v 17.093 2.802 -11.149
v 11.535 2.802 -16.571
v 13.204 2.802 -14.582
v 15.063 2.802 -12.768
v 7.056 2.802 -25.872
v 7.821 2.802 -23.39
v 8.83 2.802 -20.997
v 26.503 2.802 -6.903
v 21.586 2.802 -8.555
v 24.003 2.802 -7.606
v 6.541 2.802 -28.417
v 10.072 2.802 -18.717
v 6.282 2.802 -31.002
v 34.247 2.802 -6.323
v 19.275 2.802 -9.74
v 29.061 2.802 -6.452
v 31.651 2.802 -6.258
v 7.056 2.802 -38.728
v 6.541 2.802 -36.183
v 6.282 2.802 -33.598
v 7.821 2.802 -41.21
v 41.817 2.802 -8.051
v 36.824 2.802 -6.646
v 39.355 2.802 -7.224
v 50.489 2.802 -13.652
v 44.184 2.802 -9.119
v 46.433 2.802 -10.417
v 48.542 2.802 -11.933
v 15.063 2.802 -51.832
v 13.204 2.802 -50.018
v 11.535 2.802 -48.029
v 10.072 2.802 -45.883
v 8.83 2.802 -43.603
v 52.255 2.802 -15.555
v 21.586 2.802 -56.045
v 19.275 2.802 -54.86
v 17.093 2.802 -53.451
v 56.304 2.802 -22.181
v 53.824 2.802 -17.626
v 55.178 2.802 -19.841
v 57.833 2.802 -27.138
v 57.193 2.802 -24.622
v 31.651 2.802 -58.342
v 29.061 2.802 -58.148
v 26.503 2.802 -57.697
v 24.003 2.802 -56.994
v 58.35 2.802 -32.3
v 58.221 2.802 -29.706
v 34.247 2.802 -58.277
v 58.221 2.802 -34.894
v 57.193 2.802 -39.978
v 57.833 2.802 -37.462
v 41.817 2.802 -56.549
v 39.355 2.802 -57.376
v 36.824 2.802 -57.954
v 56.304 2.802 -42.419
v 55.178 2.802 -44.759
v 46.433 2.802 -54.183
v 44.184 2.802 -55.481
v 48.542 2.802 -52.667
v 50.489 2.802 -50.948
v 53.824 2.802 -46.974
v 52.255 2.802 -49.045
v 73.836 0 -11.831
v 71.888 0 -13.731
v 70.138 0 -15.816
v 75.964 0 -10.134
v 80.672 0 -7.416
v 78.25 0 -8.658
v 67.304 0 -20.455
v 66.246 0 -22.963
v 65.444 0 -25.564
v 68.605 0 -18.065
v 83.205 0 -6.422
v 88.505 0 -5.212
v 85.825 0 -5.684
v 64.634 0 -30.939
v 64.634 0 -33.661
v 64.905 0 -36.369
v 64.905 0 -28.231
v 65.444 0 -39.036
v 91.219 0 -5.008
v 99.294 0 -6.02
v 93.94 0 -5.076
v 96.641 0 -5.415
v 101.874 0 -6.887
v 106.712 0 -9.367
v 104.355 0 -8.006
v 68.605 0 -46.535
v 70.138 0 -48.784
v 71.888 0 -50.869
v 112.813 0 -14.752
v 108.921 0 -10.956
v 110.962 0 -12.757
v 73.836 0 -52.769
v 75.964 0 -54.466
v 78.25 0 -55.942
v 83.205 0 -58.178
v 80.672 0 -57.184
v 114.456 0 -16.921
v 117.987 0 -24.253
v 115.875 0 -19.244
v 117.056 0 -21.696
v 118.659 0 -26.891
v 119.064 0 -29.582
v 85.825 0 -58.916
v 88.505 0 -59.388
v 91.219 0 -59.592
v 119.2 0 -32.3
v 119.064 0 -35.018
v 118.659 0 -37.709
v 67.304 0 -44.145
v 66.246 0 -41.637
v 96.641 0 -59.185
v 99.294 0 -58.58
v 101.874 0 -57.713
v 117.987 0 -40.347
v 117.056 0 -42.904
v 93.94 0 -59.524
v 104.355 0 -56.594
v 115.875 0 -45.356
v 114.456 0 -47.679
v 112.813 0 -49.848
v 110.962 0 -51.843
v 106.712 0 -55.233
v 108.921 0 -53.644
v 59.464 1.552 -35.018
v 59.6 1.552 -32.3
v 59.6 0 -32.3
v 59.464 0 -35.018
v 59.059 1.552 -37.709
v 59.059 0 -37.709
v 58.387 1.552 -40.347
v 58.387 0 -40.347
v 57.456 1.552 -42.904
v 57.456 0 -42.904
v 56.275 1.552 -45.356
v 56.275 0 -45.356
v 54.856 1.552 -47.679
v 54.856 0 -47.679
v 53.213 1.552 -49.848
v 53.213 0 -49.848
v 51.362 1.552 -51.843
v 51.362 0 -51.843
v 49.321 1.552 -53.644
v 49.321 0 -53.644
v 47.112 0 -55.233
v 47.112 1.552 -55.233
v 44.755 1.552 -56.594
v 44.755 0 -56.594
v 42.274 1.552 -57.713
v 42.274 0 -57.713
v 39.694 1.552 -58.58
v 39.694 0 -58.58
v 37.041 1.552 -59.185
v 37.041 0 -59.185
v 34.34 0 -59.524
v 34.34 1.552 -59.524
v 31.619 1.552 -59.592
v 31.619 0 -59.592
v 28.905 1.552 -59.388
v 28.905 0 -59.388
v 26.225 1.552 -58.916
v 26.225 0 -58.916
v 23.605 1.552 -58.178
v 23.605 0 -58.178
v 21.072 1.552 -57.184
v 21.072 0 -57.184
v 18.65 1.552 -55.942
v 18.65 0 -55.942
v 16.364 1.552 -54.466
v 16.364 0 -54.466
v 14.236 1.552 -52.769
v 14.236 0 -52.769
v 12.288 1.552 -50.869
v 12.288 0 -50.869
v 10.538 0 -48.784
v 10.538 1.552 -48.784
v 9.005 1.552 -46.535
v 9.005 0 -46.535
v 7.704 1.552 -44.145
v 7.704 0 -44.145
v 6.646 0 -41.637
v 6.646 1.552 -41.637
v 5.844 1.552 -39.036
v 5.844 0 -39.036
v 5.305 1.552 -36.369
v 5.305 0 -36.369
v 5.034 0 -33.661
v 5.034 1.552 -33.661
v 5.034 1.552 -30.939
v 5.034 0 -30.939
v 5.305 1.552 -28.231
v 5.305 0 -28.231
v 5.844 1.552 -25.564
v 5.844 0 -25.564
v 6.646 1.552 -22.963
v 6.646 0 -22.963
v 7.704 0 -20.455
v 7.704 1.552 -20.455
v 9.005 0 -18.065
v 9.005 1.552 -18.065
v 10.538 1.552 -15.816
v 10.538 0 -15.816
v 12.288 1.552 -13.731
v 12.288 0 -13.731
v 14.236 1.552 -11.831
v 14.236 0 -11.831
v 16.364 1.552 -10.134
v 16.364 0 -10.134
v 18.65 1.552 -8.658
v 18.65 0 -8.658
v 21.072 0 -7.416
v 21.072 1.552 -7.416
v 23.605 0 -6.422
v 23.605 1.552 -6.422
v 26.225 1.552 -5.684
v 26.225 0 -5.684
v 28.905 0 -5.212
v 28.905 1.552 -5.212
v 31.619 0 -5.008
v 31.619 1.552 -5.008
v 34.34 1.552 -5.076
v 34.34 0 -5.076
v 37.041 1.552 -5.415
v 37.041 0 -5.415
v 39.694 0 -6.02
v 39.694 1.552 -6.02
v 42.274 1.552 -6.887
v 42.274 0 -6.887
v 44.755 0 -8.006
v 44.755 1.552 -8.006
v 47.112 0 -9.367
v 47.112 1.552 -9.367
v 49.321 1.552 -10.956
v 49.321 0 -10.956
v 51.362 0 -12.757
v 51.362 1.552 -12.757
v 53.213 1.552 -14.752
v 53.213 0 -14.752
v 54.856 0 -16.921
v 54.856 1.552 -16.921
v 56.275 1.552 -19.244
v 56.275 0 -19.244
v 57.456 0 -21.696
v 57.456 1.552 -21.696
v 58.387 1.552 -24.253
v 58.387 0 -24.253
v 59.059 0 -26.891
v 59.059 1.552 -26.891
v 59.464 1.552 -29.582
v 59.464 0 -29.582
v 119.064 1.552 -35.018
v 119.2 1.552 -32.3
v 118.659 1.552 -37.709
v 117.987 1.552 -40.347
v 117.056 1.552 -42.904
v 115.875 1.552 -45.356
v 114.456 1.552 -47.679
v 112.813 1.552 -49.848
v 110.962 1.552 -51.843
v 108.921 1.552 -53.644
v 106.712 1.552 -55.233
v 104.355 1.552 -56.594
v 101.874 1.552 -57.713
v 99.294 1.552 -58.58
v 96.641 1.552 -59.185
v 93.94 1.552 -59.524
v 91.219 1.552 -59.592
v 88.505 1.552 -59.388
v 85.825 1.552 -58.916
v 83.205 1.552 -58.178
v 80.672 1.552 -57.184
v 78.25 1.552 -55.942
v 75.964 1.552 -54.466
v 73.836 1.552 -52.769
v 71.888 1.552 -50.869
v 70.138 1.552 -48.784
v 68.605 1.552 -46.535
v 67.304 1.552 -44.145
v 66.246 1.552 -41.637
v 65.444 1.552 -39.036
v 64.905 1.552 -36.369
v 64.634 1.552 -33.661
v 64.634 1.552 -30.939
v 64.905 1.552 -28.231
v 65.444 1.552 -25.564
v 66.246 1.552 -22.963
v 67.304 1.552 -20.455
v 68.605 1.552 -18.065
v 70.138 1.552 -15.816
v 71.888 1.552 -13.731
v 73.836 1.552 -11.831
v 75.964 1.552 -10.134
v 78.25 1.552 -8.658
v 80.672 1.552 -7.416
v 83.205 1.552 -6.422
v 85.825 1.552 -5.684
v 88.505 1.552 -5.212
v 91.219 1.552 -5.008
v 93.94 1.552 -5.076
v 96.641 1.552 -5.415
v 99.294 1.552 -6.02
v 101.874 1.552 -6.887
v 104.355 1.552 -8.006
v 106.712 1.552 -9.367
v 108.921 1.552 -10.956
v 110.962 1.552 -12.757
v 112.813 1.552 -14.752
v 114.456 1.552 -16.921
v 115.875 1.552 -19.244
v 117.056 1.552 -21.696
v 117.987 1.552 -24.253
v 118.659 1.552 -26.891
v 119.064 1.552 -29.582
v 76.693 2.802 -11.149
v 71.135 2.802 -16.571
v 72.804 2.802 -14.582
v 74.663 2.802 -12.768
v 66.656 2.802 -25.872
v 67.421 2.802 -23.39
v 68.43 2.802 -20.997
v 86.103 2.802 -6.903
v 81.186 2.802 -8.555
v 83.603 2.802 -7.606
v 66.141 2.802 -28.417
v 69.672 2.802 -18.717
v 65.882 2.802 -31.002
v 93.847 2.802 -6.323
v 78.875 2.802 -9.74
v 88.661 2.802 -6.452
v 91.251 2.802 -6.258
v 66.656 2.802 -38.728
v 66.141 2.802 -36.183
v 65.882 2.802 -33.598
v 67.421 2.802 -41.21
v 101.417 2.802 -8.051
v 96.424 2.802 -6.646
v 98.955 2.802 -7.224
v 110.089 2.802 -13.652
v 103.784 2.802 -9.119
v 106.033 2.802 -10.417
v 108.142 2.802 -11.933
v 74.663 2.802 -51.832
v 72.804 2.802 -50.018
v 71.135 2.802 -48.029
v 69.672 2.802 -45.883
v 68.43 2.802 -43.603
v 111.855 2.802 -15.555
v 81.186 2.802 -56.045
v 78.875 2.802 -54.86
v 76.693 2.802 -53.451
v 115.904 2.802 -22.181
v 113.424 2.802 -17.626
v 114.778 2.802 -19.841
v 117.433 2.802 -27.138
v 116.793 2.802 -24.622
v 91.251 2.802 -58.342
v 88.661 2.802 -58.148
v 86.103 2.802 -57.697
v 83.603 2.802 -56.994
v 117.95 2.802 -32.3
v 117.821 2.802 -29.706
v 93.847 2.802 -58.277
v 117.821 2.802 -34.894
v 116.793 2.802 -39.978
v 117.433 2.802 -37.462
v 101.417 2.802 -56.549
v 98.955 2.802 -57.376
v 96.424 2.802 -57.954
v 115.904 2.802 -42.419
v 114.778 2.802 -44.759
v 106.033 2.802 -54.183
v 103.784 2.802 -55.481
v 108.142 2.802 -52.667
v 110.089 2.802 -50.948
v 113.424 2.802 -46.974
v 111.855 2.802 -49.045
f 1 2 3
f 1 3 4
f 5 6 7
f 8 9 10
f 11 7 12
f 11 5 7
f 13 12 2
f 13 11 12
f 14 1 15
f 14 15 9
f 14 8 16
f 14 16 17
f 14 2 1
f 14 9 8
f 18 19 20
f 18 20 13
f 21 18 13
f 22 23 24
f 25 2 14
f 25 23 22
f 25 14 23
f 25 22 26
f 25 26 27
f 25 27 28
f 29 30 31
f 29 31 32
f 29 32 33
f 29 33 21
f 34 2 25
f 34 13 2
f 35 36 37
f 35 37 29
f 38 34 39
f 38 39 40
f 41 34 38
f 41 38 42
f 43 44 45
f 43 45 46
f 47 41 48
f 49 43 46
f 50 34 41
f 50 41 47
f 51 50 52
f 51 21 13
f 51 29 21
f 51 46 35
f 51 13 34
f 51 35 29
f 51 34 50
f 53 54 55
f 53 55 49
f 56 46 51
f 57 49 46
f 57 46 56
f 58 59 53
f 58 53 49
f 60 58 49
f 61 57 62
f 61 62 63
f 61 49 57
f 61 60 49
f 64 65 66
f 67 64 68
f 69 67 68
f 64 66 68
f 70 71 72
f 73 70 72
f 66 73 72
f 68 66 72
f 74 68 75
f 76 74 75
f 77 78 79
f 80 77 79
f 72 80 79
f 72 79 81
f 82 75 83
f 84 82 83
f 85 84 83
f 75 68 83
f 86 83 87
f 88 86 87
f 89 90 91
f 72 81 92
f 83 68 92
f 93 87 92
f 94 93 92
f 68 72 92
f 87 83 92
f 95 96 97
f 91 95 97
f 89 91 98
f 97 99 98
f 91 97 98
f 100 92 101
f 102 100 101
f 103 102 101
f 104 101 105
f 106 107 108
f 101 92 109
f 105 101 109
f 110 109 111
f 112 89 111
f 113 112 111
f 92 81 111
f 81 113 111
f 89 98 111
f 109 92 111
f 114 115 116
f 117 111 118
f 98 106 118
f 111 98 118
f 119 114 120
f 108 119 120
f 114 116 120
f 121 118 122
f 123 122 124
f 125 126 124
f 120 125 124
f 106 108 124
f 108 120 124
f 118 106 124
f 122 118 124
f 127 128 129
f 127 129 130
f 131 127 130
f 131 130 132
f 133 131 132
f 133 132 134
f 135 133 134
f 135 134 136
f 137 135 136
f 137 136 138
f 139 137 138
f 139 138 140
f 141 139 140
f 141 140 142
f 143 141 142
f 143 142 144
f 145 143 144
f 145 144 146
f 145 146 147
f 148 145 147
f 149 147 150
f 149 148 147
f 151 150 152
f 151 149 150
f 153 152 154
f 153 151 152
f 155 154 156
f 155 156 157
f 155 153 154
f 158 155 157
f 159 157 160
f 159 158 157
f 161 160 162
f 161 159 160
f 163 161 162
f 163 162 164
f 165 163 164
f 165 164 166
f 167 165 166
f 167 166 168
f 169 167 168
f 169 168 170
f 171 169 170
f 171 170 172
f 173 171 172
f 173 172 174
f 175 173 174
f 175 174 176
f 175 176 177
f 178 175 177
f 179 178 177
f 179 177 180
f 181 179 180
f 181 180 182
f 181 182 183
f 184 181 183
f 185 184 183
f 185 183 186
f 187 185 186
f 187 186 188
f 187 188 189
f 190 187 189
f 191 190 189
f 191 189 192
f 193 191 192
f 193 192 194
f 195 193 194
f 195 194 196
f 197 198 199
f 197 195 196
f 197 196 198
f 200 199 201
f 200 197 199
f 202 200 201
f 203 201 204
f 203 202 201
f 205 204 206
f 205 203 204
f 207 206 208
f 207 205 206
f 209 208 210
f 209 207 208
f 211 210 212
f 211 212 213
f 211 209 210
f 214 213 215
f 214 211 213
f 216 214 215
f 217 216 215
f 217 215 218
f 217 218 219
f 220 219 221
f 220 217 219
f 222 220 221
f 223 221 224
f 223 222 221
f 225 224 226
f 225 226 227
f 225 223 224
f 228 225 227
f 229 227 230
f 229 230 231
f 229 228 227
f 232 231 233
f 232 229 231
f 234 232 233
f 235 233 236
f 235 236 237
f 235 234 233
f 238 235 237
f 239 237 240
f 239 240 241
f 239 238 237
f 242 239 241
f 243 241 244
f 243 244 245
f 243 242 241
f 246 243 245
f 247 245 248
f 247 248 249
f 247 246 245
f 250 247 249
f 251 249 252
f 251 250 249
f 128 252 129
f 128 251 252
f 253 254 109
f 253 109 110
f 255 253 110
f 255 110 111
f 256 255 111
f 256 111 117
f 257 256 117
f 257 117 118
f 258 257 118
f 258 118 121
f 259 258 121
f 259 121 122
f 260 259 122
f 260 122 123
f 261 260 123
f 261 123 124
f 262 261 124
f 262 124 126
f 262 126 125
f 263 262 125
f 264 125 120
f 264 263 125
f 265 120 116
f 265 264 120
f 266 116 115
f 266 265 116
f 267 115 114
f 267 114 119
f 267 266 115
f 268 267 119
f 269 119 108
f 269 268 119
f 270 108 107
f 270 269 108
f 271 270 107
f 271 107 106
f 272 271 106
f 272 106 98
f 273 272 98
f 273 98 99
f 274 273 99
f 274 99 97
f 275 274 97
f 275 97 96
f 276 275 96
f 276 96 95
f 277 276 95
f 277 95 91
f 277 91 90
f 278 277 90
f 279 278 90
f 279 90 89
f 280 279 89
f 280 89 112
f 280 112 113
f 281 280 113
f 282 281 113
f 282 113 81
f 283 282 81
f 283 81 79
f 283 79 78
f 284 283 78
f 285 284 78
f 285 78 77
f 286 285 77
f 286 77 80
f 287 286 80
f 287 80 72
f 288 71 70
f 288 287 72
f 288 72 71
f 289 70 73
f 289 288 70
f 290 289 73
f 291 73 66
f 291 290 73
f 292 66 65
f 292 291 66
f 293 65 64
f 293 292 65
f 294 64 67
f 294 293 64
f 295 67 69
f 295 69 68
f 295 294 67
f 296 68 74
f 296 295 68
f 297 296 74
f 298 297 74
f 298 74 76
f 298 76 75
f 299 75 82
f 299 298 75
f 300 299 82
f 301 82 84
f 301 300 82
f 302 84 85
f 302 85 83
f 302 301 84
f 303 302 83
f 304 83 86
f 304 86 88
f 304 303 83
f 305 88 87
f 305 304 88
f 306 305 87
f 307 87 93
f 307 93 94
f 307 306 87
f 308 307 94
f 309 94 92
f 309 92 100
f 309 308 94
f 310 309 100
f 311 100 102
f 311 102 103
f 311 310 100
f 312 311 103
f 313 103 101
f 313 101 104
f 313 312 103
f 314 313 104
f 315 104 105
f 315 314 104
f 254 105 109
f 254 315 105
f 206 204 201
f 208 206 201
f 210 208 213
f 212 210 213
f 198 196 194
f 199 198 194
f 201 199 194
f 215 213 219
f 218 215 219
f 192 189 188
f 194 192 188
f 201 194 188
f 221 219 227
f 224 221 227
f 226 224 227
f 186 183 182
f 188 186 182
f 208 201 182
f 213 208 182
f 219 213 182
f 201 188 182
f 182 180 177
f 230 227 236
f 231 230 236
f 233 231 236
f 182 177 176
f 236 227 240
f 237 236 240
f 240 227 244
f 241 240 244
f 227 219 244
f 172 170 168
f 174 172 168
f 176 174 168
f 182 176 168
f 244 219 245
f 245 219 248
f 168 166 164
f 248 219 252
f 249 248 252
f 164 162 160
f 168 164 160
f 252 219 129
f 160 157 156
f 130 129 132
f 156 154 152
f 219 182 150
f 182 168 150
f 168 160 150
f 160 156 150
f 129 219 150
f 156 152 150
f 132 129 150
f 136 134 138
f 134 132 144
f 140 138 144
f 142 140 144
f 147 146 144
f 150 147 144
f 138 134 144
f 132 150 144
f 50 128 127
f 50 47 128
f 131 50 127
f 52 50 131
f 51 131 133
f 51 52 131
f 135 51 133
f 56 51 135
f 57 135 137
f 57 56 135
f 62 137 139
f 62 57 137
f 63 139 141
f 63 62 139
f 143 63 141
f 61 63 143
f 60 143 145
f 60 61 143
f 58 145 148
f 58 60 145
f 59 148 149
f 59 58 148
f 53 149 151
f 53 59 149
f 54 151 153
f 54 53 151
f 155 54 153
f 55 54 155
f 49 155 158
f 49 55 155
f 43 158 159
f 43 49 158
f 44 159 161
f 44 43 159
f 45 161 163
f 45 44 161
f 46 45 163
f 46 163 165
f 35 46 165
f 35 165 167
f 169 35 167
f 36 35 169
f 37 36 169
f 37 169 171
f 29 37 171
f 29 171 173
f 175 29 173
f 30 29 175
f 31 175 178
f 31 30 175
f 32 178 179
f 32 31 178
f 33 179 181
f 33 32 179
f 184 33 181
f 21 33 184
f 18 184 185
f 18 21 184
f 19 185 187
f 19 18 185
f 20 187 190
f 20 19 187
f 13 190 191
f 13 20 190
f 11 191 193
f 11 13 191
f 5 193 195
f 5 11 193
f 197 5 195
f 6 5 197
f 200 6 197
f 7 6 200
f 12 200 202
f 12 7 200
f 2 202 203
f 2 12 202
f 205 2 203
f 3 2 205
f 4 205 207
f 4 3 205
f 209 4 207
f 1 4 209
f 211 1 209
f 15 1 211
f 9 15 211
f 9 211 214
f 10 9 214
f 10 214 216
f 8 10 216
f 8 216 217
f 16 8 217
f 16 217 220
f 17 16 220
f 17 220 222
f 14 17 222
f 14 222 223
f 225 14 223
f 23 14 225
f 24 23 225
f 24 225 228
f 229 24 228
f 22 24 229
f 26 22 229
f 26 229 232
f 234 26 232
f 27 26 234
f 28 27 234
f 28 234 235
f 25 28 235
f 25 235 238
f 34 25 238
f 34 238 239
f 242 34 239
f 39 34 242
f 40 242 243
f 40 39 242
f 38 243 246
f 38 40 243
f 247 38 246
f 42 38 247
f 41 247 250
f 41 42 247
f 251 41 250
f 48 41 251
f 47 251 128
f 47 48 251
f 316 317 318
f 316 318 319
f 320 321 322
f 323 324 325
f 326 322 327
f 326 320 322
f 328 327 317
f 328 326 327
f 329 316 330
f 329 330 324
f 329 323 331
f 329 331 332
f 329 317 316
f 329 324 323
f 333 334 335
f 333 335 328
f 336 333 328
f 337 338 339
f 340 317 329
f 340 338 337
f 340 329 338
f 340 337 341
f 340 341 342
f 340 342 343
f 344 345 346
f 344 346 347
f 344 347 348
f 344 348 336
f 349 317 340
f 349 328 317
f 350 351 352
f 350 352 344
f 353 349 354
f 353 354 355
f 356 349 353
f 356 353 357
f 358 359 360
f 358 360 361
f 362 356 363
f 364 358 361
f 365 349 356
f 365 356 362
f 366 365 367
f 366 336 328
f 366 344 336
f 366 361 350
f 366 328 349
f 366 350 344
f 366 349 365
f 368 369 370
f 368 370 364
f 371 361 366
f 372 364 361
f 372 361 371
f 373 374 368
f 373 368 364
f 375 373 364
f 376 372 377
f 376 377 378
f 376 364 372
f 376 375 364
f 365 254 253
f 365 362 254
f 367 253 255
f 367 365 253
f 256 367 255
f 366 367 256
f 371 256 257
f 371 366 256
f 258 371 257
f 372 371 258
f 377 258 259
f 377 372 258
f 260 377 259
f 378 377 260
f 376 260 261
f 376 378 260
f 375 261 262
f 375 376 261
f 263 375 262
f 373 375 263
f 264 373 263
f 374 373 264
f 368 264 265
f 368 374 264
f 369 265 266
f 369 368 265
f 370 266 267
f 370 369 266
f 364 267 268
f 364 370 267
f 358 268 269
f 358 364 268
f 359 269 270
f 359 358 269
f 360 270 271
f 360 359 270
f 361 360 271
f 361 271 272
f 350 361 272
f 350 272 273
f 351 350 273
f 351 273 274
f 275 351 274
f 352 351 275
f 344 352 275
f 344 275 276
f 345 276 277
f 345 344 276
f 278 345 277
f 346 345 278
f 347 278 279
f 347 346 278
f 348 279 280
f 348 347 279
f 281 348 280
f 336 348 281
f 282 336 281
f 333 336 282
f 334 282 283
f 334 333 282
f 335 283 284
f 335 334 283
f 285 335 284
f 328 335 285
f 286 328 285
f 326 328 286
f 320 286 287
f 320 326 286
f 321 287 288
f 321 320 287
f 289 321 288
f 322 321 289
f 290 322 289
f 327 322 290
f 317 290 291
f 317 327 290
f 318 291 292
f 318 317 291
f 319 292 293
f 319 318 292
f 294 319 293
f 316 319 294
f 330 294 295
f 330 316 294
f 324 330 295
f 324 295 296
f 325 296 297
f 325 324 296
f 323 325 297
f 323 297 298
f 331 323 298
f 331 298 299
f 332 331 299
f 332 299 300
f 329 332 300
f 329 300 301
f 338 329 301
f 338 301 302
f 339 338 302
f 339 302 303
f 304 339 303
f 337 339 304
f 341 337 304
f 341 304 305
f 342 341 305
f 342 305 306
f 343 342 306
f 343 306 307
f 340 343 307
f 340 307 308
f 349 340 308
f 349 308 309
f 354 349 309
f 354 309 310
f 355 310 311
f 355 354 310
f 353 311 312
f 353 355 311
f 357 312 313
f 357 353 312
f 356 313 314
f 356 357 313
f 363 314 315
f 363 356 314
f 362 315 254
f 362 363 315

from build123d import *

# Parameters (mm, degrees)
SKETCH1_W                         = 152.4
SKETCH1_H                         = 84.074
STOCK_DEPTH                       = 3.302
SKETCH2_W                         = 152.4
SKETCH2_H                         = 84.074
SKETCH2_R                         = 27.3
DISKS_CLEAROUT_DEPTH              = 1
DISKS_CLEAROUT_DEPTH_BACK         = 4.302
DISK0_CHAM0_SIZE                  = 1.75
DISK1_CHAM1_SIZE                  = 1.75
SKETCH3_R                         = 27.3
TOPSURFACE_SURFACEPREP_DEPTH      = 1
TOPSURFACE_SURFACEPREP_DEPTH_BACK = 0.5


with BuildPart() as part:
    # Sketch1 → stock (new body)
    with BuildSketch(Plane(origin=(0, 0, 0), x_dir=(1, 0, 0), z_dir=(0, 1, 0))):
        with Locations((76.2, 42.037)):
            Rectangle(SKETCH1_W, SKETCH1_H)
    extrude(amount=STOCK_DEPTH)

    # Sketch2 → disks-clearout (cut, two sides)
    with BuildSketch(Plane(origin=(0, 3.302, 0), x_dir=(1, 0, 0), z_dir=(0, 1, 0))) as disks_clearout_sk:
        with Locations((76.2, 42.037)):
            Rectangle(SKETCH2_W, SKETCH2_H)
        with Locations((91.9, 32.3)):
            Circle(SKETCH2_R, mode=Mode.SUBTRACT)
        with Locations((32.3, 32.3)):
            Circle(SKETCH2_R, mode=Mode.SUBTRACT)
    extrude(amount=DISKS_CLEAROUT_DEPTH, mode=Mode.SUBTRACT)
    extrude(disks_clearout_sk.sketch, amount=-DISKS_CLEAROUT_DEPTH_BACK, mode=Mode.SUBTRACT)

    # disk0-cham0
    disk0_cham0_edges = [part.edges().sort_by_distance(p)[0] for p in [
        (5, 3.302, -32.3),
    ]]
    chamfer(disk0_cham0_edges, length=DISK0_CHAM0_SIZE)

    # disk1-cham1
    disk1_cham1_edges = [part.edges().sort_by_distance(p)[0] for p in [
        (64.6, 3.302, -32.3),
    ]]
    chamfer(disk1_cham1_edges, length=DISK1_CHAM1_SIZE)

    # Sketch3 → topsurface_surfaceprep (cut, two sides)
    with BuildSketch(Plane(origin=(0, 3.302, 0), x_dir=(1, 0, 0), z_dir=(0, 1, 0))) as topsurface_surfaceprep_sk:
        with Locations((32.3, 32.3)):
            Circle(SKETCH3_R)
        with Locations((91.9, 32.3)):
            Circle(SKETCH3_R)
    extrude(amount=TOPSURFACE_SURFACEPREP_DEPTH, mode=Mode.SUBTRACT)
    extrude(topsurface_surfaceprep_sk.sketch, amount=-TOPSURFACE_SURFACEPREP_DEPTH_BACK, mode=Mode.SUBTRACT)


solid = part.part
